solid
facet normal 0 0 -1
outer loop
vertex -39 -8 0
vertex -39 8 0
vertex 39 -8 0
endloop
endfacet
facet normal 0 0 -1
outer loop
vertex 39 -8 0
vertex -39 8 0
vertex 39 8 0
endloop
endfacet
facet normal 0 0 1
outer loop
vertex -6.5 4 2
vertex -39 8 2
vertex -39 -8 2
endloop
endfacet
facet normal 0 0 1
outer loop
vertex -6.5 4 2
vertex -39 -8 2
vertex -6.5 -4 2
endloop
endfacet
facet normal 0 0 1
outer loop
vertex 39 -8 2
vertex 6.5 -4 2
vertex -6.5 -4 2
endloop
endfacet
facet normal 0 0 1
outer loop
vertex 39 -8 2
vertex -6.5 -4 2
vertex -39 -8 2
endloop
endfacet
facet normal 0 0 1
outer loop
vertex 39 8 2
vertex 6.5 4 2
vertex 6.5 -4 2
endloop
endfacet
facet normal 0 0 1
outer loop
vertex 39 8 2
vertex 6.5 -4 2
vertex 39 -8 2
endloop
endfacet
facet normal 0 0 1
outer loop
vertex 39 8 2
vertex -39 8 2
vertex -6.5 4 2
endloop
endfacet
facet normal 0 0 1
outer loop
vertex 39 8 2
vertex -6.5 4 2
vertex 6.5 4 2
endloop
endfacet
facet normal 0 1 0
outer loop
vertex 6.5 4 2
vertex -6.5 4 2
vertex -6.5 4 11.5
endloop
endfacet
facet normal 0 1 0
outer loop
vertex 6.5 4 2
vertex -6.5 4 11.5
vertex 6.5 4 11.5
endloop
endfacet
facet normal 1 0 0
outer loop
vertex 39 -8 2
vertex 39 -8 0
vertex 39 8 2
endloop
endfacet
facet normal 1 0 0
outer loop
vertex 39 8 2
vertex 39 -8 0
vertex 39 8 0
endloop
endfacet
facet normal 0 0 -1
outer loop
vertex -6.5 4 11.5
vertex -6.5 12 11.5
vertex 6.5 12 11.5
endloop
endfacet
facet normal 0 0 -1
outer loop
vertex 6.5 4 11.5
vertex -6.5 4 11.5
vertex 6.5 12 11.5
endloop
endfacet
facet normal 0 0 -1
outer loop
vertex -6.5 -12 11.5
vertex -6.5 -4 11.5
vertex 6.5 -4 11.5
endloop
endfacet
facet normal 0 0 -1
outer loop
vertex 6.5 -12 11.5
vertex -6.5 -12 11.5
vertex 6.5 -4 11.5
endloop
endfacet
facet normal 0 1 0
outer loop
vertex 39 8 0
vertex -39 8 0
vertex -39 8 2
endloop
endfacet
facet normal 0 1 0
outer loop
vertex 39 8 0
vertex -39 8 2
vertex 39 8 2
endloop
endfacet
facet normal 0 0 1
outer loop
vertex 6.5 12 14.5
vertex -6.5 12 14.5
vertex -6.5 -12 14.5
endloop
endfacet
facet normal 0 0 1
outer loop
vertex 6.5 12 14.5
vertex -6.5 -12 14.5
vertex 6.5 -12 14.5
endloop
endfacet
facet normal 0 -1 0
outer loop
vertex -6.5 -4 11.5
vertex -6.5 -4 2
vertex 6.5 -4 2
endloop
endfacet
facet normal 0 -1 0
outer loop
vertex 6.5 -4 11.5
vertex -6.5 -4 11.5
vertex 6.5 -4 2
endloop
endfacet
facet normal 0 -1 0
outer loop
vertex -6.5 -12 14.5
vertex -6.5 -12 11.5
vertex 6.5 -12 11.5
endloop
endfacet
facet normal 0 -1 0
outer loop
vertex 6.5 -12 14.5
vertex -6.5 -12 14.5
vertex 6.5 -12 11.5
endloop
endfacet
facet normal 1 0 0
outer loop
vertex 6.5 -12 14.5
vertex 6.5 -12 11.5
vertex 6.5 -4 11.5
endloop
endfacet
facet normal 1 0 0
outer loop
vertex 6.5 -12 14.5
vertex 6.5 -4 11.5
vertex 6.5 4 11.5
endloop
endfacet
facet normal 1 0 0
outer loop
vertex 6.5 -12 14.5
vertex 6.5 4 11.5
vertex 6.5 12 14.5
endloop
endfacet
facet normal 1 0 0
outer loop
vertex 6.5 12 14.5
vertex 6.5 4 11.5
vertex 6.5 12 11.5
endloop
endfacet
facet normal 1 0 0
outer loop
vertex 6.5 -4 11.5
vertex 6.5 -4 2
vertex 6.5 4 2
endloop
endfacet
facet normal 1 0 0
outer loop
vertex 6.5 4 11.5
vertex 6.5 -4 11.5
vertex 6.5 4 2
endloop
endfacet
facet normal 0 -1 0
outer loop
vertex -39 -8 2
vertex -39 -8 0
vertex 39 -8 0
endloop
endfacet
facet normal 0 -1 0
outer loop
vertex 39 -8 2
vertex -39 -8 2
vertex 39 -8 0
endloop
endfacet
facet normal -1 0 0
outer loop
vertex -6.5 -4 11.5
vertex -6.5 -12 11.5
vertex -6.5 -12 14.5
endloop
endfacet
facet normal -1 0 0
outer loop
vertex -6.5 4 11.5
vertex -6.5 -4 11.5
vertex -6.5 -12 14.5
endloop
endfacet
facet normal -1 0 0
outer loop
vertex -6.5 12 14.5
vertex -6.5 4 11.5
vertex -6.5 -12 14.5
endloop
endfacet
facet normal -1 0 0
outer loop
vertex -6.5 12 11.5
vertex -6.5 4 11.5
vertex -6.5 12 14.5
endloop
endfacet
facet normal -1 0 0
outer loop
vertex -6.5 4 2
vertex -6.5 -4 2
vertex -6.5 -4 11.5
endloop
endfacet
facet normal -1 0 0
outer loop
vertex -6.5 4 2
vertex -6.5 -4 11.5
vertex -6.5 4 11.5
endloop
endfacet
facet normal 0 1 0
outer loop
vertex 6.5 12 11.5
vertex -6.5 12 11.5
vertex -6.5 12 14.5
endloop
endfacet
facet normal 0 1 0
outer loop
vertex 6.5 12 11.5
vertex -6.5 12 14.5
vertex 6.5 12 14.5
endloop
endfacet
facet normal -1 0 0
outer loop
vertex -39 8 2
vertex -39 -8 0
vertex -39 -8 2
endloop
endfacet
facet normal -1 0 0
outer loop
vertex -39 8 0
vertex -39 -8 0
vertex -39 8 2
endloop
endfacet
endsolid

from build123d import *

# Parameters (mm, degrees)
SKETCH1_W           = 78
SKETCH1_H           = 16
BOSS_EXTRUDE1_DEPTH = 2
SKETCH2_W           = 13
SKETCH2_H           = 8
BOSS_EXTRUDE2_DEPTH = 9.5
SKETCH3_W           = 13
SKETCH3_H           = 24
BOSS_EXTRUDE3_DEPTH = 3


with BuildPart() as part:
    # Sketch1 → Boss-Extrude1 (new body)
    with BuildSketch(Plane.XY):
        Rectangle(SKETCH1_W, SKETCH1_H)
    extrude(amount=BOSS_EXTRUDE1_DEPTH)

    # Sketch2 → Boss-Extrude2 (add)
    with BuildSketch(Plane.XY.offset(2)):
        Rectangle(SKETCH2_W, SKETCH2_H)
    extrude(amount=BOSS_EXTRUDE2_DEPTH)

    # Sketch3 → Boss-Extrude3 (add)
    with BuildSketch(Plane.XY.offset(11.5)):
        Rectangle(SKETCH3_W, SKETCH3_H)
    extrude(amount=BOSS_EXTRUDE3_DEPTH)


solid = part.part
